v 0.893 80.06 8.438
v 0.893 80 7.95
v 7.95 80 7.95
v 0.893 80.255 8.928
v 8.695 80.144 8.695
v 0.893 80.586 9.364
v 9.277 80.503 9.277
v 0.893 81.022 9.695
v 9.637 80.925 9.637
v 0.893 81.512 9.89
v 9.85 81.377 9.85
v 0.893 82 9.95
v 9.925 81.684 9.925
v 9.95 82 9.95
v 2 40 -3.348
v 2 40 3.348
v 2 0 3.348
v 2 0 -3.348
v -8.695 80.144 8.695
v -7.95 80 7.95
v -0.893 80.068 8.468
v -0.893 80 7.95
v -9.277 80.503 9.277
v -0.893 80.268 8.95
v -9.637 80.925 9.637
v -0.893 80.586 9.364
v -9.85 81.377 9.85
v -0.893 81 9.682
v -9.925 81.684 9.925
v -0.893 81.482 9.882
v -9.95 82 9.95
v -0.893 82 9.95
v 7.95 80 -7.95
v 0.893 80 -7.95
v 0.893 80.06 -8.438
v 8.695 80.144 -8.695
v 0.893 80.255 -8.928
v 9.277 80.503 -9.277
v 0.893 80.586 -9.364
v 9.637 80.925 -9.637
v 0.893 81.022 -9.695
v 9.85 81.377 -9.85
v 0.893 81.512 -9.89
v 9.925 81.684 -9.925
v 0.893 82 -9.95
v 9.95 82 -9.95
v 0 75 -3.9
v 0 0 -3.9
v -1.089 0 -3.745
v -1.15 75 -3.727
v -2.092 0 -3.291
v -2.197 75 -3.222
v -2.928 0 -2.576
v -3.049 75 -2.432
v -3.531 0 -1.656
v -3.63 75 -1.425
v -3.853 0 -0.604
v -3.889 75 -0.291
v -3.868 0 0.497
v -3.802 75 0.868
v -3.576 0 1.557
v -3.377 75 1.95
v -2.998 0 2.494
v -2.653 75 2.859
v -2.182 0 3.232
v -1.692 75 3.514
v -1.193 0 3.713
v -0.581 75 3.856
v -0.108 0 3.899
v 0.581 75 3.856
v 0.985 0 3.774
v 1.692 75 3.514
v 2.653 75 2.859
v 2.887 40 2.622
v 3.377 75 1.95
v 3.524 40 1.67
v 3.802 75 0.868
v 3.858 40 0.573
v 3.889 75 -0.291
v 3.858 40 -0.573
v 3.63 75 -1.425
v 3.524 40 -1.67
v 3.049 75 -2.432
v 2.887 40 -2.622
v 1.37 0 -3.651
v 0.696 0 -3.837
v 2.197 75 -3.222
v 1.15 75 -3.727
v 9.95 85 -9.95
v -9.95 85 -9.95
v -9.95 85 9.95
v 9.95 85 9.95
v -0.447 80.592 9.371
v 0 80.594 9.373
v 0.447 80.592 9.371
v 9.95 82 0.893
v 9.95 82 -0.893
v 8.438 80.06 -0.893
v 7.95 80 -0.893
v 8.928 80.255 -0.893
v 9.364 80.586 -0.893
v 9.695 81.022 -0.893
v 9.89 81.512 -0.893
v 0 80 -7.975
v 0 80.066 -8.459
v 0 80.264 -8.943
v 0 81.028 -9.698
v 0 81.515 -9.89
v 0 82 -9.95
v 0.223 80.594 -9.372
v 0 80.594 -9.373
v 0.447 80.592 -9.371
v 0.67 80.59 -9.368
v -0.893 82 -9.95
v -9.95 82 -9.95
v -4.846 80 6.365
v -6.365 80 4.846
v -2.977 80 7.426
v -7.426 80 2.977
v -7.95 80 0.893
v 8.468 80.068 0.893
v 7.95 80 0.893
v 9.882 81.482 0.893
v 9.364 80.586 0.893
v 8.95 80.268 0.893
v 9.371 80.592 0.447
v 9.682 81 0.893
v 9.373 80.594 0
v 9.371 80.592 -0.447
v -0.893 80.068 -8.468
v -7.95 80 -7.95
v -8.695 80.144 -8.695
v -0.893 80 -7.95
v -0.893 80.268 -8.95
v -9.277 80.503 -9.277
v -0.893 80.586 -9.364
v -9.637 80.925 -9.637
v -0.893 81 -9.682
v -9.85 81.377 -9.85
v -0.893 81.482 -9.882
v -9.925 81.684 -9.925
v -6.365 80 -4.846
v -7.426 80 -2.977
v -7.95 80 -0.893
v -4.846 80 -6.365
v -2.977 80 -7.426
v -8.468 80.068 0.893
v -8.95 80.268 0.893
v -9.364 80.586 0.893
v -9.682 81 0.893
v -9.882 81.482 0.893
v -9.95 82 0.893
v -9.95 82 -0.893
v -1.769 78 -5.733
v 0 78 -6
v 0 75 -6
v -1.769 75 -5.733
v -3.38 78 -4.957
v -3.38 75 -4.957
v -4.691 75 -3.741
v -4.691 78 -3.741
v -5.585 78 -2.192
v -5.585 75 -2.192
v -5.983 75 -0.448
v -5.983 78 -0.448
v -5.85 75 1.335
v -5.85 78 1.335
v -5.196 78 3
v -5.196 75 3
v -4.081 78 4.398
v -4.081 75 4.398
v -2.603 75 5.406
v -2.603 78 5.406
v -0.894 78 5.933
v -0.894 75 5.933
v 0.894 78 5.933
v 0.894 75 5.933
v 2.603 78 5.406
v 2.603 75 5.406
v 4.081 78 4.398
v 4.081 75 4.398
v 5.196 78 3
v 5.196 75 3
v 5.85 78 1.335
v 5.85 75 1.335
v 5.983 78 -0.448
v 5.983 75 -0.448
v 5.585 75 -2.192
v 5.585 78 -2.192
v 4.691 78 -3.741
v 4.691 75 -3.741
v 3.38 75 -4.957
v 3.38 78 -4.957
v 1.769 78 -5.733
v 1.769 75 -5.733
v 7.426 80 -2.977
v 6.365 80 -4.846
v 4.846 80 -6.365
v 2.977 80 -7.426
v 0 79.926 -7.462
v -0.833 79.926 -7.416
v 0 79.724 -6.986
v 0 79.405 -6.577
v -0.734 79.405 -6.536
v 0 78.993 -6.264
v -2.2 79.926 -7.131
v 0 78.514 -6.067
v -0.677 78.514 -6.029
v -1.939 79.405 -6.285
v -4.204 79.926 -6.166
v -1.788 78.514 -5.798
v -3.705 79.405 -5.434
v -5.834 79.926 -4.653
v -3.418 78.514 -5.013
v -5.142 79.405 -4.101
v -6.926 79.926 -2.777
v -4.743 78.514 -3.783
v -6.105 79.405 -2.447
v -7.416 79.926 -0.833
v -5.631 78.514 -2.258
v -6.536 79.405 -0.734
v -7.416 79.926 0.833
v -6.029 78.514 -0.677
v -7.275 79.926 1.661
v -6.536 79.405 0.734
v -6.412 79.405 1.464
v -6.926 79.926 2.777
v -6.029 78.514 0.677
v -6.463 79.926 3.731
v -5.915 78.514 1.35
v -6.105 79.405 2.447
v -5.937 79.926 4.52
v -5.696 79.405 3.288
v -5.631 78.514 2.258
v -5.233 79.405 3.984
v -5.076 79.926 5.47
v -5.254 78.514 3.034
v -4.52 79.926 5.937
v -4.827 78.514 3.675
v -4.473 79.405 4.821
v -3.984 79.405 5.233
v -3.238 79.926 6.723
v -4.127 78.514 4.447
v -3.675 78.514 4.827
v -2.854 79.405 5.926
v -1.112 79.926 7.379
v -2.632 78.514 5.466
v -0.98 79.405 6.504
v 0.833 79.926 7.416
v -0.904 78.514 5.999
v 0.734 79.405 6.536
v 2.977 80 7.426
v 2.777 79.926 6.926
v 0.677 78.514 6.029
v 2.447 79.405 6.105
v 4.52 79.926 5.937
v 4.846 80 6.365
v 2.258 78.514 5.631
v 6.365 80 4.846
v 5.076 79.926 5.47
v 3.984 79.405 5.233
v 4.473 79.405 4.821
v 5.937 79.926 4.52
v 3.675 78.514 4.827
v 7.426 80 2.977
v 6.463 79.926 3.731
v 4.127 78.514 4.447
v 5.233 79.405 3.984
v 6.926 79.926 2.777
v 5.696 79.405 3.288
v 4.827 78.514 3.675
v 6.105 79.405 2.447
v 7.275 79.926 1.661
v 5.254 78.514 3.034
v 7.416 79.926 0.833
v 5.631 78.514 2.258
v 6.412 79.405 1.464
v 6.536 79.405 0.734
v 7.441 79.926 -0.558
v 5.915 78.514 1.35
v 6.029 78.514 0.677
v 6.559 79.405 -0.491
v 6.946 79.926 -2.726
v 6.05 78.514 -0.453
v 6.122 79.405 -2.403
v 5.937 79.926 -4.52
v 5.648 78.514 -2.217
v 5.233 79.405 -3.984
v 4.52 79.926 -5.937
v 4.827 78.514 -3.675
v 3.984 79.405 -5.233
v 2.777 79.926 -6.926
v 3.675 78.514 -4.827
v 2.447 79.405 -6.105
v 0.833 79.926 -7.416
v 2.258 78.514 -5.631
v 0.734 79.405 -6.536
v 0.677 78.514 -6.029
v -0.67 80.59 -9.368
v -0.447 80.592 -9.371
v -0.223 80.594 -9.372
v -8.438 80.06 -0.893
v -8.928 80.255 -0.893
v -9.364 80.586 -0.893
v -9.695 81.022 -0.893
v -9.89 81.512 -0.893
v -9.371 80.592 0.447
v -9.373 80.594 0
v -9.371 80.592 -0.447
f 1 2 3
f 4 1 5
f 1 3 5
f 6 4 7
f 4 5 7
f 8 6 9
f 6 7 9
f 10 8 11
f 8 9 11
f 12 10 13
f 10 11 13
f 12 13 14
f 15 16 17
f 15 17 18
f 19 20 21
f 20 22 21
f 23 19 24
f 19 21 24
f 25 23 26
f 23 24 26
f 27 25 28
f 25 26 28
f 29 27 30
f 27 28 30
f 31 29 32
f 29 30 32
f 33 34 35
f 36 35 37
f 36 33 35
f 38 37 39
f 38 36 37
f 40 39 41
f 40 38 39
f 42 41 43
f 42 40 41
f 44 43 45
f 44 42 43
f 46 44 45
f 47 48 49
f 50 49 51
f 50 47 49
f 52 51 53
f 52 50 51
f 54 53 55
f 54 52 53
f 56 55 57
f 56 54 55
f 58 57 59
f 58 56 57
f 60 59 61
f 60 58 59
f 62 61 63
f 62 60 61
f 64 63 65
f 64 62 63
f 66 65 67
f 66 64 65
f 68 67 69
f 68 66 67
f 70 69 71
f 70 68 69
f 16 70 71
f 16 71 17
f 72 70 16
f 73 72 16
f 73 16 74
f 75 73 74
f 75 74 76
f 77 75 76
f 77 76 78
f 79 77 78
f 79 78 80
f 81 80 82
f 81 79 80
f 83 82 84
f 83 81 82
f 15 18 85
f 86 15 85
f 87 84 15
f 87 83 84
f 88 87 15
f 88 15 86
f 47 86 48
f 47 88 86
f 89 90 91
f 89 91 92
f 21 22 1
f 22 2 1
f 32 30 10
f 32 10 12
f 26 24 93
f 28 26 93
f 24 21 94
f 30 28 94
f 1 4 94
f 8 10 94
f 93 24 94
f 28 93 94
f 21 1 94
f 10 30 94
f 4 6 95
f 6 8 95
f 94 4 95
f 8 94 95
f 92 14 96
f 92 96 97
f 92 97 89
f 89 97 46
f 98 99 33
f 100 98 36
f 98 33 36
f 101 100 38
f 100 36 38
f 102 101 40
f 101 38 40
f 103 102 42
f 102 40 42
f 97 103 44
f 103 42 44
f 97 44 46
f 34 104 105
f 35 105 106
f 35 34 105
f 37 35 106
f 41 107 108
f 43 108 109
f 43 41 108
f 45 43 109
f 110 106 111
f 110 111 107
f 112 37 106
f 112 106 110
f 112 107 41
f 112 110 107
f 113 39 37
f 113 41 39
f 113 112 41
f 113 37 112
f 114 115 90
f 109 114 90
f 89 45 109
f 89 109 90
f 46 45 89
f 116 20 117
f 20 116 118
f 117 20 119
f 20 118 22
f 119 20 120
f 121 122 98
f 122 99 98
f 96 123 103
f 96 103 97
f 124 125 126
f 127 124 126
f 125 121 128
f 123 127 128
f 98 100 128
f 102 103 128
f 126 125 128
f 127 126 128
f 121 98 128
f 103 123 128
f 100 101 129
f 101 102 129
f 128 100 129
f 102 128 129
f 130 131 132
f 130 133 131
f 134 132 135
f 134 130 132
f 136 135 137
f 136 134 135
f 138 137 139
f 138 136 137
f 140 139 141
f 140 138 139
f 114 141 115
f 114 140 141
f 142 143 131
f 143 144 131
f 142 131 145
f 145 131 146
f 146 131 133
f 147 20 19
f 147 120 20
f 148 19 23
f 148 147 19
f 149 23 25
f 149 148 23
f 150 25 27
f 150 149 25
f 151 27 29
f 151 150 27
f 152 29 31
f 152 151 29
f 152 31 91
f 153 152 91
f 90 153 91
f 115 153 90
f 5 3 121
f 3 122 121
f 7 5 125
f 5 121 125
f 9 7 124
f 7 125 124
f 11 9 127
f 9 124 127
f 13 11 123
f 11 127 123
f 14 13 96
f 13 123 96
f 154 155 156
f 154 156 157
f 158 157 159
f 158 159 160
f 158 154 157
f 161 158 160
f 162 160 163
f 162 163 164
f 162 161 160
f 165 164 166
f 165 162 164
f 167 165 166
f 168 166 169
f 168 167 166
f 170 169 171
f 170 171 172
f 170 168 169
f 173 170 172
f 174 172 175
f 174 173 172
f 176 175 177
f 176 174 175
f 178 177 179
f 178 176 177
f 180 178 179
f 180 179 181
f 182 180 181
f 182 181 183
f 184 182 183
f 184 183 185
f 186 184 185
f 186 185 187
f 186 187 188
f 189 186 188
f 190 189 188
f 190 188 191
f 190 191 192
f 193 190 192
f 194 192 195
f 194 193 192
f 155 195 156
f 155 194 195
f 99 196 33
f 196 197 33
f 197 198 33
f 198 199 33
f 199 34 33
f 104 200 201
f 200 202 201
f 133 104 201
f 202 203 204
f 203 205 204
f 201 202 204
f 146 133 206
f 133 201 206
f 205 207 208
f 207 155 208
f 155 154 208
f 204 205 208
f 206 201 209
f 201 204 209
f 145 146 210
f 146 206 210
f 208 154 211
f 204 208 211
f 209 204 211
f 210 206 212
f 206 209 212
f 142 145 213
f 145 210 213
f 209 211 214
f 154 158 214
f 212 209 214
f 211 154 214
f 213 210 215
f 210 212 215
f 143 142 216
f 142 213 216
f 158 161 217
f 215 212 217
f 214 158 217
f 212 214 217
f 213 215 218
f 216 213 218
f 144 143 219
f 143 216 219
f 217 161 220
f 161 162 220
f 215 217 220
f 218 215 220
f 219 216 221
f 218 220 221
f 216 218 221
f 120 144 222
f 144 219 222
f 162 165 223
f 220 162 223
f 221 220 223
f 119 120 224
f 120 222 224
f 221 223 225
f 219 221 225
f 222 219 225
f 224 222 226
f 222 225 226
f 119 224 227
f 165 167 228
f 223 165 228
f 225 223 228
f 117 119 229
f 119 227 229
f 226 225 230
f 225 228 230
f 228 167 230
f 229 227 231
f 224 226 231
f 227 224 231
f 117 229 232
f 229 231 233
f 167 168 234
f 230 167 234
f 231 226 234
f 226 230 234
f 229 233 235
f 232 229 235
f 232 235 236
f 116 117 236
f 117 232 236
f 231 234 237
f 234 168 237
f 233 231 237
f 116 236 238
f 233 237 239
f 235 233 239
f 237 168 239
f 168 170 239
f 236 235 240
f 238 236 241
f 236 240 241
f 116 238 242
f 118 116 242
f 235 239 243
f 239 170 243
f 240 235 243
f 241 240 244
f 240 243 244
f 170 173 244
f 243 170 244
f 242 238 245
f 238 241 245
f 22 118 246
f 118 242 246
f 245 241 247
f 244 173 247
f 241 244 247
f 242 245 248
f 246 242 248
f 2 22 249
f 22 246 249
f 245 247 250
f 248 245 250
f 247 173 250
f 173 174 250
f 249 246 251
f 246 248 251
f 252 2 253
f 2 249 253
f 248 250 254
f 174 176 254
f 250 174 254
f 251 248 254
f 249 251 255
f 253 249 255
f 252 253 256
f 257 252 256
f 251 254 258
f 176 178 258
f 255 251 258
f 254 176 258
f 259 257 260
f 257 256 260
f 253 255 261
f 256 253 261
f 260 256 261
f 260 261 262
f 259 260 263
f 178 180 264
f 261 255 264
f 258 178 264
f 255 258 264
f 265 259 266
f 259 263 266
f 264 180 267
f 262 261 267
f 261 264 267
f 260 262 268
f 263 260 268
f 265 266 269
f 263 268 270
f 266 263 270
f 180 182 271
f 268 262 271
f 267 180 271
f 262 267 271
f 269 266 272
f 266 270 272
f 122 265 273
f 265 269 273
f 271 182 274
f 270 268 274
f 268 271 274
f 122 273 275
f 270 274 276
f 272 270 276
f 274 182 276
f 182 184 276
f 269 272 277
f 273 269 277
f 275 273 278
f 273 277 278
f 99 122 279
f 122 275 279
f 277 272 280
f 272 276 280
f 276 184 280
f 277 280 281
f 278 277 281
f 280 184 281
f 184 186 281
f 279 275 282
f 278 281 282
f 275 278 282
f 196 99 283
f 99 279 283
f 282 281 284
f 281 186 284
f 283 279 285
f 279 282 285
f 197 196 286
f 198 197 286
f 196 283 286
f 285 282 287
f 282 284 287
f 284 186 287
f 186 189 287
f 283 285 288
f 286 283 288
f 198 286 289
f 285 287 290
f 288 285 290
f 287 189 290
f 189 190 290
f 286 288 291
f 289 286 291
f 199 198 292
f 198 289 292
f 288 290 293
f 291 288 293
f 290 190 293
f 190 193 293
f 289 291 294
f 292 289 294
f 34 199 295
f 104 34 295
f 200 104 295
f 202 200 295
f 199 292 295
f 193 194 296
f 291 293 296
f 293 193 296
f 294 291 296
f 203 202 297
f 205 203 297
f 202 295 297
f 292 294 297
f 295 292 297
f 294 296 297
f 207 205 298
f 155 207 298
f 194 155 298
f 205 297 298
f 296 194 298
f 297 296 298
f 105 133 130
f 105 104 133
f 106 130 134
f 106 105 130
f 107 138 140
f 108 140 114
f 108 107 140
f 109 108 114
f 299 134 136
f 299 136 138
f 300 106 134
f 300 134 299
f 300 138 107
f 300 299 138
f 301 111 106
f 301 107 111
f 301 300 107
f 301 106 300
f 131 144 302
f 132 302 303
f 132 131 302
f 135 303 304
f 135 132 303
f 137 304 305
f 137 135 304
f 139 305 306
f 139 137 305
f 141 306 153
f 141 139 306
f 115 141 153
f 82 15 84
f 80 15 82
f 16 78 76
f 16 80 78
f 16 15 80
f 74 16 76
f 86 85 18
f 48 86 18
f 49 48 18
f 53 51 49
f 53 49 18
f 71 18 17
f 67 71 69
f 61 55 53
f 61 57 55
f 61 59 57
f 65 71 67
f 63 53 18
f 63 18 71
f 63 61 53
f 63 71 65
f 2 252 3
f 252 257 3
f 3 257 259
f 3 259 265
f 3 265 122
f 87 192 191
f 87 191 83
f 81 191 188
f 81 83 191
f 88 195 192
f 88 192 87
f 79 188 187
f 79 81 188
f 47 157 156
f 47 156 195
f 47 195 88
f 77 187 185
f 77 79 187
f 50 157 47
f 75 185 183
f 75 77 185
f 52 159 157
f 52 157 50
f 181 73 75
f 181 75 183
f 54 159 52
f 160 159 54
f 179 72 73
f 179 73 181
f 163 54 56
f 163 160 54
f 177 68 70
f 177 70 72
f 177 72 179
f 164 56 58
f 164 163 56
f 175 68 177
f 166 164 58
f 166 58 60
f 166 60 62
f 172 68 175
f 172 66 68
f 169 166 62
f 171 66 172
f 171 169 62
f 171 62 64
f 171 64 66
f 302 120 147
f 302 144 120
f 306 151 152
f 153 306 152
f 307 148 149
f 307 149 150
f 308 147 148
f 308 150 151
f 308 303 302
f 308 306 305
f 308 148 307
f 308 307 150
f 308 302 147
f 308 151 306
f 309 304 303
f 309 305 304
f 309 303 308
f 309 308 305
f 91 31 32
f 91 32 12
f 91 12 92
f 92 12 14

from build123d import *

# Parameters (mm, degrees)
CROQUIS2_W                 = 19.9
CROQUIS2_H                 = 19.9
SALIENTE_EXTRUIR1_DEPTH    = 5
CORTAR_EXTRUIR1_DEPTH      = 87.156862756
CORTAR_EXTRUIR1_DEPTH_BACK = 40
REDONDEO3_R                = 2
REDONDEO4_R                = 2


with BuildPart() as part:
    # Croquis1 → Revolución1 (revolve)
    with BuildSketch(Plane(origin=(0, 0, 0), x_dir=(0, 0, -1), z_dir=(1, 0, 0)), mode=Mode.PRIVATE) as revoluci_n1_sk:
        Polygon((0, 0), (-3.9, 0), (-3.9, 75), (-6, 75), (-6, 80), (0, 80), align=None)
    revolve(revoluci_n1_sk.sketch.rotate(Axis((0, 0, 0), (0, 1, 0)), 180), axis=Axis((0, 0, 0), (0, 1, 0)))

    # Croquis2 → Saliente-Extruir1 (add)
    with BuildSketch(Plane(origin=(0, 80, 0), x_dir=(1, 0, 0), z_dir=(0, 1, 0))):
        Rectangle(CROQUIS2_W, CROQUIS2_H)
    extrude(amount=SALIENTE_EXTRUIR1_DEPTH)

    # Croquis3 → Cortar-Extruir1 (cut, two sides: drawn at the far end of the back side and taken through both)
    with BuildSketch(Plane.XZ.offset(-CORTAR_EXTRUIR1_DEPTH_BACK)):
        Polygon((2, 49.105251298), (2, 3.348133809), (2, -3.348133809), (2, -49.105251298), (93.514234979, -49.105251298), (93.514234979, 49.105251298), align=None)
    extrude(amount=CORTAR_EXTRUIR1_DEPTH + CORTAR_EXTRUIR1_DEPTH_BACK, mode=Mode.SUBTRACT)

    # Redondeo3
    redondeo3_edges = [part.edges().sort_by_distance(p)[0] for p in [
        (0, 80, 6),
    ]]
    fillet(redondeo3_edges, radius=REDONDEO3_R)

    # Redondeo4
    redondeo4_edges = [part.edges().sort_by_distance(p)[0] for p in [
        (0, 80, 9.95),
        (9.95, 80, 0),
        (-9.95, 80, 0),
        (0, 80, -9.95),
    ]]
    fillet(redondeo4_edges, radius=REDONDEO4_R)


solid = part.part
